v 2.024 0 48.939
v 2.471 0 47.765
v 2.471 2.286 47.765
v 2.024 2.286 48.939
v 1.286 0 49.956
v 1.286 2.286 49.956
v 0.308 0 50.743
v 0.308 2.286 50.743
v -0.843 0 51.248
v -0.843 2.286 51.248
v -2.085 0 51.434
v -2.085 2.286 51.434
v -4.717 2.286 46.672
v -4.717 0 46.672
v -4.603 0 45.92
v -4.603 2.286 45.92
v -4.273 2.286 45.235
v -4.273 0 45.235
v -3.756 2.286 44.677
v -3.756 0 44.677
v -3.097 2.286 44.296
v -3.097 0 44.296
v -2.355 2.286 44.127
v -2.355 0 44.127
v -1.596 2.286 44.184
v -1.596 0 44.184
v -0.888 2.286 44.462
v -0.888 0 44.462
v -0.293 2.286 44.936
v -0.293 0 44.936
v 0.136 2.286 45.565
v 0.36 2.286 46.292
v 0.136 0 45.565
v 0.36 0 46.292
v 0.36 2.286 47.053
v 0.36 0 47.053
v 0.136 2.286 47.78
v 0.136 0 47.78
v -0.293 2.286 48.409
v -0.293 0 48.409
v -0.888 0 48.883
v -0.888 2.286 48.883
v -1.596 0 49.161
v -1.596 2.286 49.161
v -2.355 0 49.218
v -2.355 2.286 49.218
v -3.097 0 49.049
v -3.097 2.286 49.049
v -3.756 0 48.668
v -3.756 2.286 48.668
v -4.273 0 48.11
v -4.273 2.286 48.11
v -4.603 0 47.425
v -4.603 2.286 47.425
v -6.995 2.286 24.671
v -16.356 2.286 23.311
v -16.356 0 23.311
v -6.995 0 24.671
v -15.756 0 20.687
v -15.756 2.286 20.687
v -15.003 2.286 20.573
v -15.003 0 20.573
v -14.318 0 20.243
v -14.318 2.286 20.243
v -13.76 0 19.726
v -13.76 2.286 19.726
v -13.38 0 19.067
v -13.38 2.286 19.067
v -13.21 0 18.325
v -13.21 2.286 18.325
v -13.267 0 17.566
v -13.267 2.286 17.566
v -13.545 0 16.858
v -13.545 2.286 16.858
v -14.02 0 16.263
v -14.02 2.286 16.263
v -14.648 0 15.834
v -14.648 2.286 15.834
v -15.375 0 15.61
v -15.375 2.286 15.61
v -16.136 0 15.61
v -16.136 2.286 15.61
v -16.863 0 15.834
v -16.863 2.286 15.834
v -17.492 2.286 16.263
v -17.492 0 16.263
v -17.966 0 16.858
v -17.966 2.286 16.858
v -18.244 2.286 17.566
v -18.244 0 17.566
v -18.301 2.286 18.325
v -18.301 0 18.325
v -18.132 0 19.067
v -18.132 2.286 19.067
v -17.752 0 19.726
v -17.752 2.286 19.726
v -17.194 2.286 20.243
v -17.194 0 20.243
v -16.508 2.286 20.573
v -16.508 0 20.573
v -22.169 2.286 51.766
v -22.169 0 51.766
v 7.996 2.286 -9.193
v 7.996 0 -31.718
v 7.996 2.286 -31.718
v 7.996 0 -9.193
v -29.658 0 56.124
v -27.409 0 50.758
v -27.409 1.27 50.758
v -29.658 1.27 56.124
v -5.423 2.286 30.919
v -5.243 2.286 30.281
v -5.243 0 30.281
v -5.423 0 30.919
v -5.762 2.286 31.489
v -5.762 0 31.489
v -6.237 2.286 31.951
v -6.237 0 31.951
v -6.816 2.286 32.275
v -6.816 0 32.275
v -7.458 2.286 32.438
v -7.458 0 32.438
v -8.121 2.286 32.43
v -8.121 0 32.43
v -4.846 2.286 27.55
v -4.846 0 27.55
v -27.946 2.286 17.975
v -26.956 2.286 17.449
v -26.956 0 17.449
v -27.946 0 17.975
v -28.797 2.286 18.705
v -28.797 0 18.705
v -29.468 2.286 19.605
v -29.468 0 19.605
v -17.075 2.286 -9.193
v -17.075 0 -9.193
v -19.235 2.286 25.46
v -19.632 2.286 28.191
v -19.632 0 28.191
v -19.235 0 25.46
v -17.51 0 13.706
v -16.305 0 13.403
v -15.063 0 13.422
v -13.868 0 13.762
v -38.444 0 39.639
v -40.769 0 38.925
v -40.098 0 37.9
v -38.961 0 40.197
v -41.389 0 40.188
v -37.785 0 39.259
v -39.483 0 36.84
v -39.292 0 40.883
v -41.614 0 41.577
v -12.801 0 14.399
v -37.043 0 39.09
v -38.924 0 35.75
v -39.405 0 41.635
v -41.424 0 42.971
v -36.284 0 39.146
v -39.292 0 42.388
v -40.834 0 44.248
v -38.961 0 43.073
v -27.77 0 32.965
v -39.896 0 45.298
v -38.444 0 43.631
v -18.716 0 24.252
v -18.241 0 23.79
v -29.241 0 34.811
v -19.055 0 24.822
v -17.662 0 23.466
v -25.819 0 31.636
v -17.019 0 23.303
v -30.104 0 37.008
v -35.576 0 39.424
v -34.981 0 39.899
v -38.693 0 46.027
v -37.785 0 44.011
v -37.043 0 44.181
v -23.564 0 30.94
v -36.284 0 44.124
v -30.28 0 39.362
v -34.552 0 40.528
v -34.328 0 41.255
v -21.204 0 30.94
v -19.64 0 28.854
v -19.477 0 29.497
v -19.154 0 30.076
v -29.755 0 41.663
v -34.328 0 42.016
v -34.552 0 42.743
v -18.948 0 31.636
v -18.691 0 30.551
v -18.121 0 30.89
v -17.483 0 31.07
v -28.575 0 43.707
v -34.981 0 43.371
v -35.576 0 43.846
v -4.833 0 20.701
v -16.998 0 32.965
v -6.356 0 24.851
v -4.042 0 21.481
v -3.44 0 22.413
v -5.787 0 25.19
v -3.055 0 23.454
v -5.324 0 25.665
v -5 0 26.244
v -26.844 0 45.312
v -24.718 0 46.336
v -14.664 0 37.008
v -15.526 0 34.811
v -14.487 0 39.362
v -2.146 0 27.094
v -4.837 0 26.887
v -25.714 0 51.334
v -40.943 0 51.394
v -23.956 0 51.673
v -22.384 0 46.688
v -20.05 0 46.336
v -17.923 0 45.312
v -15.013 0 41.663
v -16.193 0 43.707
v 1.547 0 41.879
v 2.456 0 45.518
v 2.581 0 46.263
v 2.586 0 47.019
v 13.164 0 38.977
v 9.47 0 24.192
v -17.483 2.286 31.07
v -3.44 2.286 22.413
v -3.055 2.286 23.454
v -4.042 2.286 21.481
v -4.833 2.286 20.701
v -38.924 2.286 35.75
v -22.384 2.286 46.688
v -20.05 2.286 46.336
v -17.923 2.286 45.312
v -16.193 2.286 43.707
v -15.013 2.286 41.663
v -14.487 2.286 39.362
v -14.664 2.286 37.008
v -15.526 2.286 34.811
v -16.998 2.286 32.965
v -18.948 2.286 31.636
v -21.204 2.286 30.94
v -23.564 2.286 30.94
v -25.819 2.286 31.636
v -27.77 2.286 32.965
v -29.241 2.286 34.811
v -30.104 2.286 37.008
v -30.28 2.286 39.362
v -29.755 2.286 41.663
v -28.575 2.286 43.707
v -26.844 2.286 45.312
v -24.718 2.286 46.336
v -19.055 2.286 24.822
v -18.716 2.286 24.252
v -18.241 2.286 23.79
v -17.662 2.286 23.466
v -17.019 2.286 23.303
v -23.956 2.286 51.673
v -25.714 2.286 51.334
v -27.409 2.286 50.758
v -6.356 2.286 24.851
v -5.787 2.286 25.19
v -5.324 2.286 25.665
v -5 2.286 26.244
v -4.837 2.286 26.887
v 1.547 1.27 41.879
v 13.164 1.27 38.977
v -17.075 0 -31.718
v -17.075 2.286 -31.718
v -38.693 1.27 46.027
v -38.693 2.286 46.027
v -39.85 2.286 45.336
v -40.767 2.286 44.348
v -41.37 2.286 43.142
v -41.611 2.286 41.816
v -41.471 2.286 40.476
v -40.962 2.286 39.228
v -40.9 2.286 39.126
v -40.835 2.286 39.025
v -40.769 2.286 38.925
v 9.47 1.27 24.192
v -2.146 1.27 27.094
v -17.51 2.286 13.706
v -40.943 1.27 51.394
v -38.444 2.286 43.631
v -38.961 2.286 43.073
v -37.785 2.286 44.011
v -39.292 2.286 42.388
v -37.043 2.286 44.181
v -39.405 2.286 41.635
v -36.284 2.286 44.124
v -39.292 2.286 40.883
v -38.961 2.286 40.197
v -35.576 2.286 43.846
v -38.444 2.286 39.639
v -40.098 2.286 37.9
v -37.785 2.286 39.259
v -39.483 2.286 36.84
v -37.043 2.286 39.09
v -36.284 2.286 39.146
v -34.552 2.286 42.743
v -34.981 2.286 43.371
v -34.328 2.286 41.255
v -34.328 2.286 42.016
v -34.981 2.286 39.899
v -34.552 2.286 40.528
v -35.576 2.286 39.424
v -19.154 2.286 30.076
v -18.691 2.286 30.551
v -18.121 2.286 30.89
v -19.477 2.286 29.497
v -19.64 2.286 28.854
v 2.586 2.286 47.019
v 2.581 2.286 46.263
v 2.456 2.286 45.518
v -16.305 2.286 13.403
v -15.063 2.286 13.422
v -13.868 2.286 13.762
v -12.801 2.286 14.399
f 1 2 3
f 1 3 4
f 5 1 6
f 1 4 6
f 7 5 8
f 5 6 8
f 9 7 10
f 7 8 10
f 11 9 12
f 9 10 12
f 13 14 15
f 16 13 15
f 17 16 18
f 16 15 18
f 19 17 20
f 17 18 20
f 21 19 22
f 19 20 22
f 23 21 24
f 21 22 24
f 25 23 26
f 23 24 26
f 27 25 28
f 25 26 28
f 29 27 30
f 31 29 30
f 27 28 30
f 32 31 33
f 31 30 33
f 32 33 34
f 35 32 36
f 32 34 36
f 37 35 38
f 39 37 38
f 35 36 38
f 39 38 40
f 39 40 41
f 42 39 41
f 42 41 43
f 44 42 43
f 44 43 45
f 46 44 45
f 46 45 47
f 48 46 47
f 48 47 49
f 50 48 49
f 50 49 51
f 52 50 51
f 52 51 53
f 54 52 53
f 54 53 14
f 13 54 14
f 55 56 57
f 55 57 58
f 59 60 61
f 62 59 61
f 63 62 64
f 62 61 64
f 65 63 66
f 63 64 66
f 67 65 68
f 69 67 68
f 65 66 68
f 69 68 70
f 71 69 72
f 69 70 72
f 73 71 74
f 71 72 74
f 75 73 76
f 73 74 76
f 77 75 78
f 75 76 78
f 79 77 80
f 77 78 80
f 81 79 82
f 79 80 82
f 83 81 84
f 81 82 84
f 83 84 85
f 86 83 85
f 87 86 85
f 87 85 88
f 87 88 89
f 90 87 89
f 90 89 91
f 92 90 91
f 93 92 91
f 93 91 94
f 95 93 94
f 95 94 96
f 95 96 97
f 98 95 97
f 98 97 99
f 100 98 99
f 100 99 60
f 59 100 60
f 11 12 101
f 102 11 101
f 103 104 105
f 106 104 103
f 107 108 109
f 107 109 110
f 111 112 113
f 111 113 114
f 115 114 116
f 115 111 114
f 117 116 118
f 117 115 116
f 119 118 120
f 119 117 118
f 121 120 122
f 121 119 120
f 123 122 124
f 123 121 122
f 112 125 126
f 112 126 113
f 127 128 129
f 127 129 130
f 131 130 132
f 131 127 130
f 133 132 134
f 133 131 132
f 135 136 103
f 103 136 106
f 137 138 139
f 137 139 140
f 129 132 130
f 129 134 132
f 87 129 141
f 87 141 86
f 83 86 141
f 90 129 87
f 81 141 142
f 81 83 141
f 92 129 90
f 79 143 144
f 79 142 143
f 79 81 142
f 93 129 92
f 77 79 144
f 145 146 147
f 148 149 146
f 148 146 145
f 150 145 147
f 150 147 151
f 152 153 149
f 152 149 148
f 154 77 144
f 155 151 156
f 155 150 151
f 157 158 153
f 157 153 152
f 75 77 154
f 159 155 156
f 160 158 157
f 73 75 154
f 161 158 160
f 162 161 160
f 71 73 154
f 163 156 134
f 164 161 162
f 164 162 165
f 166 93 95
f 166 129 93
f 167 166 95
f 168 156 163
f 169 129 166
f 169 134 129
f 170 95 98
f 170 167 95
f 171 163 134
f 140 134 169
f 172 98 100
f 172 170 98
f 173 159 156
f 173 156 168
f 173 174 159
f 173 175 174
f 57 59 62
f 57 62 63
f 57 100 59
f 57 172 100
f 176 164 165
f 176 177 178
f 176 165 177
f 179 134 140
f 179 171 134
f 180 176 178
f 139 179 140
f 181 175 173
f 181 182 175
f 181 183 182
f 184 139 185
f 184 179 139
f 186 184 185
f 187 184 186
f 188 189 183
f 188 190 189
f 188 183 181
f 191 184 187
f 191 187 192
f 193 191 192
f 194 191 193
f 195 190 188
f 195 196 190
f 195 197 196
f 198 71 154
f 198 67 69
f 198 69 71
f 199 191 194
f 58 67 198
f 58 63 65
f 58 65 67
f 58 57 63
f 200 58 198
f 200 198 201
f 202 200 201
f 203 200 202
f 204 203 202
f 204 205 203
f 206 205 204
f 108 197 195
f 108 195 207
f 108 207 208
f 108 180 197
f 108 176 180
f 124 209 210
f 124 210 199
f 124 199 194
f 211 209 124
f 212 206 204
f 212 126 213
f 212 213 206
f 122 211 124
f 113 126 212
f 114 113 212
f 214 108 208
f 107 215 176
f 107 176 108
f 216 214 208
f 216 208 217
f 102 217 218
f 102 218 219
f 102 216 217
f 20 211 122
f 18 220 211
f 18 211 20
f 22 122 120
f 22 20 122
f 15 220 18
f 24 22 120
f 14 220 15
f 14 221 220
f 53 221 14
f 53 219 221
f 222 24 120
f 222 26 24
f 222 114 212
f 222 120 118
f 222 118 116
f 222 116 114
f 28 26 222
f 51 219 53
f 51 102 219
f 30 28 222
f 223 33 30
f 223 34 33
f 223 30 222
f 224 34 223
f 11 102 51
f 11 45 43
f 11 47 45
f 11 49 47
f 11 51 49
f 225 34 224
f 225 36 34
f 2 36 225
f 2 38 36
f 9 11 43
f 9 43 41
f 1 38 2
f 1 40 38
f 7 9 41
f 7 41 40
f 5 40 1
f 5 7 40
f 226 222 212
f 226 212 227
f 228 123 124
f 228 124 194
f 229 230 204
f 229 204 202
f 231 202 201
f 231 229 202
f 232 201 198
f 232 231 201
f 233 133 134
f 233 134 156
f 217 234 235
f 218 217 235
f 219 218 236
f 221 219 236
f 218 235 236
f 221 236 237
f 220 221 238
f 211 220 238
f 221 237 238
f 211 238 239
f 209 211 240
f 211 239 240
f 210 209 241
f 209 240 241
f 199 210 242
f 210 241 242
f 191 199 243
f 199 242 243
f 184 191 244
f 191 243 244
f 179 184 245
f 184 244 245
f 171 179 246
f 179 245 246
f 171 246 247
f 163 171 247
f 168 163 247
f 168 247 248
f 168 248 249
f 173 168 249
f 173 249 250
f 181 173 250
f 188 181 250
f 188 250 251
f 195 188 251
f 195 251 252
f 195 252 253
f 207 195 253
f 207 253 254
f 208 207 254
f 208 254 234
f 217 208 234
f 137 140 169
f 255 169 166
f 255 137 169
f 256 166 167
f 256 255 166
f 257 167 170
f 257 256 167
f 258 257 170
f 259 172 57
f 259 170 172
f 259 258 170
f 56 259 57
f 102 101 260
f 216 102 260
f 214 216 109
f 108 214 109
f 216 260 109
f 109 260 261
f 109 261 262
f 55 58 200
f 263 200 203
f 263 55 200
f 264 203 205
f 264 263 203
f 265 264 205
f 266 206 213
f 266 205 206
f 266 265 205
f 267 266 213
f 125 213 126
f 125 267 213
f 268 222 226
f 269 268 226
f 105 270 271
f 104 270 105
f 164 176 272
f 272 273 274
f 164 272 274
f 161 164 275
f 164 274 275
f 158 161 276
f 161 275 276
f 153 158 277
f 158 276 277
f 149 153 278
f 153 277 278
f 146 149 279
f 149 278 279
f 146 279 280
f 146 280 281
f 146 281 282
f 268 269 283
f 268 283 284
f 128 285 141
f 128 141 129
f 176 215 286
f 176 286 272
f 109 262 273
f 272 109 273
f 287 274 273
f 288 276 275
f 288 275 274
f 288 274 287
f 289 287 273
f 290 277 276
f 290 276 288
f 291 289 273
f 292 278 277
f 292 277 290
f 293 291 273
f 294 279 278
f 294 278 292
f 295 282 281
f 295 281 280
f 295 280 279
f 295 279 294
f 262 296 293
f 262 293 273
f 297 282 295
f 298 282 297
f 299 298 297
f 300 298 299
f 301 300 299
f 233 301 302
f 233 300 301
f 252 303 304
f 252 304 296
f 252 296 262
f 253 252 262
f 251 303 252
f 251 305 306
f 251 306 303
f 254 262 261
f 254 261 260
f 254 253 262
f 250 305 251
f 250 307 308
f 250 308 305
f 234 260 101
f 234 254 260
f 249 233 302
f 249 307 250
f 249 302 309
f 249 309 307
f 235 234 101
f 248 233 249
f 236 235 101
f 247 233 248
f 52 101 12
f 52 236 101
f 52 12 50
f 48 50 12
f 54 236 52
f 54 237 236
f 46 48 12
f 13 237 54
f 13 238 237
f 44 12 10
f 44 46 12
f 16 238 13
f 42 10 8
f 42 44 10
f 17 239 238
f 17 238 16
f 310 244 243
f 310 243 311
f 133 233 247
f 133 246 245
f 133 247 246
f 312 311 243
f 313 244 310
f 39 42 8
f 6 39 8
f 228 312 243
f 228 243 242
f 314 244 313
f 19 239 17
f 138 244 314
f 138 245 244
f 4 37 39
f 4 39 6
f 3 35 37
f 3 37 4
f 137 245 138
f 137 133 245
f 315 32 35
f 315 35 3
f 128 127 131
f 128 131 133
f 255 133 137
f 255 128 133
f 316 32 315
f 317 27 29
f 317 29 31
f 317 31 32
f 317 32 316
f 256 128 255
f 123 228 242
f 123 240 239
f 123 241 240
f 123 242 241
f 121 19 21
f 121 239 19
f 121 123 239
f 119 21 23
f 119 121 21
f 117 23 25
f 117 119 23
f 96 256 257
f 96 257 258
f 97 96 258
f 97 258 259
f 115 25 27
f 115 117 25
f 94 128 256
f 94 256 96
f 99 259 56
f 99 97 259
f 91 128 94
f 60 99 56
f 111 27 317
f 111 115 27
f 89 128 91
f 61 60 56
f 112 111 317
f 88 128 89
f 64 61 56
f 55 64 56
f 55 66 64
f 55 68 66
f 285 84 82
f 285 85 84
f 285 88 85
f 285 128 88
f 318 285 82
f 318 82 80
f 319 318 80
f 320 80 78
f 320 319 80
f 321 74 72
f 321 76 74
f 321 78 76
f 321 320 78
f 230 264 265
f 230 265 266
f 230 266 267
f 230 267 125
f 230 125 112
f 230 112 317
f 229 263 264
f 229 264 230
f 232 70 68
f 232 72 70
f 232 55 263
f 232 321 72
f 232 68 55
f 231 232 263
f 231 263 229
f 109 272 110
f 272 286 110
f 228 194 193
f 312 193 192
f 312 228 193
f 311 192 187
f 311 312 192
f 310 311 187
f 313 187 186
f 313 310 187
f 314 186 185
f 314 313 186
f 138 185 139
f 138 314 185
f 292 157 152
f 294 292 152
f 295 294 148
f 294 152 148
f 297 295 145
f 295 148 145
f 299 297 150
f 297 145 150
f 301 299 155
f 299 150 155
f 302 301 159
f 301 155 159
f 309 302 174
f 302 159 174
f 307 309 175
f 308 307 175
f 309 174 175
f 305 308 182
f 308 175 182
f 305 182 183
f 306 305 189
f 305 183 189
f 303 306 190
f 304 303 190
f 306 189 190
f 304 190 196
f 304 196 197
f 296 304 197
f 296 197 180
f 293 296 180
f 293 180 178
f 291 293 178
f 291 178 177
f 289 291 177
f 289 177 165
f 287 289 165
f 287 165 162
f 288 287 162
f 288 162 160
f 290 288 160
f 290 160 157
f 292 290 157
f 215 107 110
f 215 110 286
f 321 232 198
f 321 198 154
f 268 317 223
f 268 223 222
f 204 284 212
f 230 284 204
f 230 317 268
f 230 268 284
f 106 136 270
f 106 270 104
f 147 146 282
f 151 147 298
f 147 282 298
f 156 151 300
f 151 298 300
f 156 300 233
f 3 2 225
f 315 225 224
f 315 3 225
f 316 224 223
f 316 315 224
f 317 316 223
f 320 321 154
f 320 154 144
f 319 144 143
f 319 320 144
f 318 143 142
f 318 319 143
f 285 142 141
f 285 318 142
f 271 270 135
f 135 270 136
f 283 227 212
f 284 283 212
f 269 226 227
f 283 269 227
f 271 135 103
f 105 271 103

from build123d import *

# Parameters (mm, degrees)
BOSS_EXTRUDE4_DEPTH              = 4.7625
CUT_EXTRUDE1_REACH               = 271.353
SKETCH6_R                        = 14.26845
SKETCH6_R_2                      = 22.86
CUT_EXTRUDE2_REACH               = 271.353
SKETCH7_R                        = 18.48095
CUT_EXTRUDE4_DEPTH               = 270.352829076
BOSS_EXTRUDE9_START              = -4.7625
BOSS_EXTRUDE9_DEPTH              = 4.7625
FILLET1_R                        = 7.62
F_10_CLEARANCE_HOLE1_D           = 4.9784
FILLET4_R                        = 50.8
F_8_32_TAPPED_HOLE1_D            = 3.4544
PIVOTING_BEAM_SENSOR_MOUNT_REACH = 271.268
SKETCH37_R                       = 1.5
SKETCH38_R                       = 7.91845
ENCODER_BOARD_ADDON_DEPTH        = 4.7625
F_10_32_TAPPED_HOLE1_D           = 4.0386
F_10_CLEARANCE_HOLE3_D           = 5.1054
SKETCH47_OUTSIDE_W               = 192.439
SKETCH47_OUTSIDE_H               = 382.734
SKETCH47_OUTSIDE_R               = 2.5527
CUT_EXTRUDE8_DEPTH               = 270.267923318
SKETCH47_2_R                     = 2.5527
CUT_EXTRUDE9_DEPTH               = 2.4765
BOSS_EXTRUDE17_DEPTH             = 1.27
SKETCH59_W                       = 25.070606449
SKETCH59_H                       = 22.525049467
BOSS_EXTRUDE18_DEPTH             = 2.286


with BuildPart() as part:
    # Sketch1 → Boss-Extrude4 (new body)
    with BuildSketch(Plane(origin=(0, 0, 0), x_dir=(1, 0, 0), z_dir=(0, 1, 0))):
        with BuildLine():
            Line((-48.759061319, 205.201963751), (-63.900240413, 124.413609674))
            Line((-63.900240413, 124.413609674), (-26.343120253, -7.50014102))
            ThreePointArc((-26.343120253, -7.50014102), (3.91326684, -27.109010359), (27.388801541, 0.256222825))
            ThreePointArc((27.388801541, 0.256222825), (34.508498918, 53.661639681), (56.295976161, 102.93774419))
            ThreePointArc((56.295976161, 102.93774419), (56.986751486, 124.47275891), (38.624985881, 135.745717413))
            ThreePointArc((38.624985881, 135.745717413), (4.94281576, 154.646064466), (1.637545013, 193.127058321))
            Line((1.637545013, 193.127058321), (18.706481277, 233.364638746))
            ThreePointArc((18.706481277, 233.364638746), (10.708035835, 258.569637187), (-15.424905572, 254.527799821))
            Line((-15.424905572, 254.527799821), (-37.390675283, 228.913568565))
            ThreePointArc((-37.390675283, 228.913568565), (-44.635714299, 217.806104366), (-48.759061319, 205.201963751))
        make_face()
    extrude(amount=BOSS_EXTRUDE4_DEPTH)

    # Sketch6 → Cut-Extrude1 (cut, up to next)
    with BuildSketch(Plane(origin=(0, 4.7625, 0), x_dir=(1, 0, 0), z_dir=(0, 1, 0)), mode=Mode.PRIVATE) as cut_extrude1_sk1:
        with Locations(Location((38.1, 114.3, 0), (0, 0, 270))):
            Circle(SKETCH6_R)
    cut_extrude1_tool1 = extrude(cut_extrude1_sk1.sketch, amount=-CUT_EXTRUDE1_REACH, mode=Mode.PRIVATE) & part.part
    # Sketch6 → Cut-Extrude1 (cut, up to next)
    with BuildSketch(Plane(origin=(0, 4.7625, 0), x_dir=(1, 0, 0), z_dir=(0, 1, 0)), mode=Mode.PRIVATE) as cut_extrude1_sk2:
        with Locations(Location((-4.294087555, 47.653799352, 0), (0, 0, 270))):
            Circle(SKETCH6_R_2)
    cut_extrude1_tool2 = extrude(cut_extrude1_sk2.sketch, amount=-CUT_EXTRUDE1_REACH, mode=Mode.PRIVATE) & part.part
    # Sketch6 → Cut-Extrude1 (cut, up to next)
    with BuildSketch(Plane(origin=(0, 4.7625, 0), x_dir=(1, 0, 0), z_dir=(0, 1, 0)), mode=Mode.PRIVATE) as cut_extrude1_sk3:
        with Locations(Location((-25.238541156, 93.240320194, 0), (0, 0, 270))):
            Circle(SKETCH6_R)
    cut_extrude1_tool3 = extrude(cut_extrude1_sk3.sketch, amount=-CUT_EXTRUDE1_REACH, mode=Mode.PRIVATE) & part.part
    # Sketch6 → Cut-Extrude1 (cut, up to next)
    with BuildSketch(Plane(origin=(0, 4.7625, 0), x_dir=(1, 0, 0), z_dir=(0, 1, 0)), mode=Mode.PRIVATE) as cut_extrude1_sk4:
        with Locations(Location((-31.378993813, 133.413749735, 0), (0, 0, 270))):
            Circle(SKETCH6_R)
    cut_extrude1_tool4 = extrude(cut_extrude1_sk4.sketch, amount=-CUT_EXTRUDE1_REACH, mode=Mode.PRIVATE) & part.part
    # Sketch6 → Cut-Extrude1 (cut, up to next)
    with BuildSketch(Plane(origin=(0, 4.7625, 0), x_dir=(1, 0, 0), z_dir=(0, 1, 0)), mode=Mode.PRIVATE) as cut_extrude1_sk5:
        with Locations(Location((0, 241.3, 0), (0, 0, 270))):
            Circle(SKETCH6_R)
    cut_extrude1_tool5 = extrude(cut_extrude1_sk5.sketch, amount=-CUT_EXTRUDE1_REACH, mode=Mode.PRIVATE) & part.part
    add(cut_extrude1_tool1.solids().sort_by_distance((38.1, 4.7625, -114.3))[0], mode=Mode.SUBTRACT)
    add(cut_extrude1_tool2.solids().sort_by_distance((-4.294088, 4.7625, -47.653799))[0], mode=Mode.SUBTRACT)
    add(cut_extrude1_tool3.solids().sort_by_distance((-25.238541, 4.7625, -93.24032))[0], mode=Mode.SUBTRACT)
    add(cut_extrude1_tool4.solids().sort_by_distance((-31.378994, 4.7625, -133.41375))[0], mode=Mode.SUBTRACT)
    add(cut_extrude1_tool5.solids().sort_by_distance((0, 4.7625, -241.3))[0], mode=Mode.SUBTRACT)

    # Sketch7 → Cut-Extrude2 (cut, up to next)
    with BuildSketch(Plane(origin=(0, 4.7625, 0), x_dir=(1, 0, 0), z_dir=(0, 1, 0)), mode=Mode.PRIVATE) as cut_extrude2_sk1:
        with Locations(Location((0, 0, 0), (0, 0, 270))):
            Circle(SKETCH7_R)
    cut_extrude2_tool1 = extrude(cut_extrude2_sk1.sketch, amount=-CUT_EXTRUDE2_REACH, mode=Mode.PRIVATE) & part.part
    add(cut_extrude2_tool1.solids().sort_by_distance((0, 4.7625, 0))[0], mode=Mode.SUBTRACT)

    # Sketch11 → Cut-Extrude4 (cut, through all)
    with BuildSketch(Plane(origin=(0, 4.7625, 0), x_dir=(1, 0, 0), z_dir=(0, 1, 0))):
        with BuildLine():
            Line((-14.24681913, 167.157327815), (-22.781165939, 169.646710179))
            ThreePointArc((-22.781165939, 169.646710179), (-24.940081812, 173.583756312), (-21.003035679, 175.742672185))
            Line((-21.003035679, 175.742672185), (-12.46868887, 173.253289821))
            ThreePointArc((-12.46868887, 173.253289821), (-10.309772997, 169.316243688), (-14.24681913, 167.157327815))
        make_face()
    extrude(amount=-CUT_EXTRUDE4_DEPTH, mode=Mode.SUBTRACT)

    # Sketch22 → Boss-Extrude9 (add)
    with BuildSketch(Plane(origin=(0, 4.7625, 0), x_dir=(1, 0, 0), z_dir=(0, 1, 0)).offset(BOSS_EXTRUDE9_START)):
        with BuildLine():
            Line((44.13587102, -0.238974107), (45.721176973, 83.59457079))
            ThreePointArc((45.721176973, 83.59457079), (31.828729714, 42.965057017), (27.388801541, 0.256222825))
            ThreePointArc((27.388801541, 0.256222825), (27.389946843, 0.053962259), (27.389598514, -0.14830125))
            Line((27.389598514, -0.14830125), (44.13587102, -0.238974107))
        make_face()
        with BuildLine():
            Line((-26.343120253, -7.50014102), (-63.900240413, 124.413609674))
            Line((-63.900240413, 124.413609674), (-58.659130106, 55.341604227))
            ThreePointArc((-58.659130106, 55.341604227), (-58.57862185, 54.70676299), (-58.434627096, 54.083248366))
            Line((-58.434627096, 54.083248366), (-39.267840062, -13.237215919))
            Line((-39.267840062, -13.237215919), (-25.732483938, -9.383569172))
            ThreePointArc((-25.732483938, -9.383569172), (-26.054826105, -8.447374541), (-26.343120253, -7.50014102))
        make_face()
    extrude(amount=BOSS_EXTRUDE9_DEPTH)

    # Fillet1
    fillet1_edges = [part.edges().sort_by_distance(p)[0] for p in [
        (44.13587102, 2.38125, 0.238974107),
        (27.389598514, 2.38125, 0.14830125),
        (45.721176973, 2.38125, -83.59457079),
        (-25.732483938, 2.38125, 9.383569172),
    ]]
    fillet(fillet1_edges, radius=FILLET1_R)

    # #10 Clearance Hole1 (through all)
    with Locations(Plane(origin=(0, 4.7625, 0), x_dir=(1, 0, 0), z_dir=(0, 1, 0))):
        with Locations((-20.169087555, 23.894274946), (-52.327331966, 55.822054335), (31.486575952, 69.734116153), (0.686224782, 152.463749735), (-32.612193782, 193.553892754), (-52.098807962, 161.528602156)):
            Hole(F_10_CLEARANCE_HOLE1_D / 2)

    # Fillet4
    fillet4_edges = [part.edges().sort_by_distance(p)[0] for p in [
        (-63.900240413, 2.38125, -124.413609674),
    ]]
    fillet(fillet4_edges, radius=FILLET4_R)

    # #8-32 Tapped Hole1 (through all)
    with Locations(Plane(origin=(0, 4.7625, 0), x_dir=(1, 0, 0), z_dir=(0, 1, 0))):
        with Locations((1.914830287, -21.24990167), (13.247190201, 16.725335505), (-17.940310329, 11.548599972)):
            Hole(F_8_32_TAPPED_HOLE1_D / 2)

    # Sketch37 → Pivoting Beam Sensor Mount (cut, up to next)
    with BuildSketch(Plane.XZ, mode=Mode.PRIVATE) as pivoting_beam_sensor_mount_sk1:
        with Locations(Location((23.083384984, -92.174973762, 0), (0, 0, 270))):
            Circle(SKETCH37_R)
    pivoting_beam_sensor_mount_tool1 = extrude(pivoting_beam_sensor_mount_sk1.sketch, amount=-PIVOTING_BEAM_SENSOR_MOUNT_REACH, mode=Mode.PRIVATE) & part.part
    # Sketch37 → Pivoting Beam Sensor Mount (cut, up to next)
    with BuildSketch(Plane.XZ, mode=Mode.PRIVATE) as pivoting_beam_sensor_mount_sk2:
        with BuildLine():
            ThreePointArc((-3.647543534, -89.163751321), (-3.541377345, -96.013206549), (-1.708587973, -102.613751321))
            ThreePointArc((-1.708587973, -102.613751321), (0.255952019, -103.414115377), (1.056316075, -101.449575385))
            ThreePointArc((1.056316075, -101.449575385), (-0.572072996, -95.585150848), (-0.666399089, -89.499575385))
            ThreePointArc((-0.666399089, -89.499575385), (-1.989059279, -87.841091131), (-3.647543534, -89.163751321))
        make_face()
    pivoting_beam_sensor_mount_tool2 = extrude(pivoting_beam_sensor_mount_sk2.sketch, amount=-PIVOTING_BEAM_SENSOR_MOUNT_REACH, mode=Mode.PRIVATE) & part.part
    add(pivoting_beam_sensor_mount_tool1.solids().sort_by_distance((23.083385, 0, -92.174974))[0], mode=Mode.SUBTRACT)
    add(pivoting_beam_sensor_mount_tool2.solids().sort_by_distance((-1.700962, 0, -95.747892))[0], mode=Mode.SUBTRACT)

    # Sketch38 → Encoder Board Addon (add)
    with BuildSketch(Plane(origin=(0, 4.7625, 0), x_dir=(1, 0, 0), z_dir=(0, 1, 0))):
        with BuildLine():
            Line((-37.529034093, -19.344511049), (-39.267840062, -13.237215919))
            Line((-39.267840062, -13.237215919), (-31.839812047, -11.12238453))
            ThreePointArc((-31.839812047, -11.12238453), (-27.003669081, -11.344505665), (-23.277388672, -14.435209614))
            ThreePointArc((-23.277388672, -14.435209614), (-5.966086008, -26.732338427), (14.931018089, -22.962508548))
            ThreePointArc((14.931018089, -22.962508548), (8.591508195, -29.075813245), (4.9829433, -37.109501029))
            Line((4.9829433, -37.109501029), (2.47141259, -47.765086321))
            ThreePointArc((2.47141259, -47.765086321), (0.822880543, -50.381887664), (-2.085320348, -51.434348945))
            Line((-2.085320348, -51.434348945), (-22.168826979, -51.766465319))
            ThreePointArc((-22.168826979, -51.766465319), (-24.841143263, -51.533840241), (-27.408807967, -50.757640062))
            Line((-27.408807967, -50.757640062), (-38.693349579, -46.027393508))
            ThreePointArc((-38.693349579, -46.027393508), (-41.42356145, -42.97092165), (-40.768594617, -38.925294934))
            ThreePointArc((-40.768594617, -38.925294934), (-36.952648742, -29.498249601), (-37.529034093, -19.344511049))
        make_face()
        with Locations(Location((-22.38375, -38.769792264, 0), (0, 0, 270))):
            Circle(SKETCH38_R, mode=Mode.SUBTRACT)
    extrude(amount=-ENCODER_BOARD_ADDON_DEPTH)

    # #10-32 Tapped Hole1 (through all)
    with Locations(Plane(origin=(0, 4.7625, 0), x_dir=(1, 0, 0), z_dir=(0, 1, 0))):
        with Locations((-2.164065959, -46.6725), (-36.852219401, -41.635167886), (-15.755793253, -18.133994079)):
            Hole(F_10_32_TAPPED_HOLE1_D / 2)

    # #10 Clearance Hole3 (through all)
    with Locations(Plane(origin=(0, 4.7625, 0), x_dir=(1, 0, 0), z_dir=(0, 1, 0))):
        with Locations((-36.852219401, -41.635167886), (-2.164065959, -46.6725)):
            Hole(F_10_CLEARANCE_HOLE3_D / 2)

    # Sketch47 outside → Cut-Extrude8 (cut, through all)
    # profile 1 of 3: a face of its own
    with BuildSketch(Plane(origin=(0, 4.7625, 0), x_dir=(1, 0, 0), z_dir=(0, 1, 0))):
        with Locations((-1.9945, 104.926)):
            Rectangle(SKETCH47_OUTSIDE_W, SKETCH47_OUTSIDE_H)
        with BuildLine():
            Line((-38.693349579, -46.027393508), (-27.408807967, -50.757640062))
            ThreePointArc((-27.408807967, -50.757640062), (-24.841143263, -51.533840241), (-22.168826979, -51.766465319))
            Line((-22.168826979, -51.766465319), (-2.085320348, -51.434348945))
            ThreePointArc((-2.085320348, -51.434348945), (1.613604275, -49.572605834), (2.456445703, -45.518256427))
            Line((2.456445703, -45.518256427), (-3.055299638, -23.454383414))
            ThreePointArc((-3.055299638, -23.454383414), (-3.715825704, -21.93050709), (-4.832568275, -20.701125227))
            Line((-4.832568275, -20.701125227), (-12.801470938, -14.398570955))
            ThreePointArc((-12.801470938, -14.398570955), (-15.063238725, -13.422118181), (-17.510319119, -13.706461444))
            Line((-17.510319119, -13.706461444), (-26.955722074, -17.449449957))
            ThreePointArc((-26.955722074, -17.449449957), (-28.392130747, -18.316742481), (-29.467648755, -19.604658322))
            Line((-29.467648755, -19.604658322), (-40.96167653, -39.228143092))
            ThreePointArc((-40.96167653, -39.228143092), (-41.369942708, -43.14234484), (-38.693349579, -46.027393508))
        make_face(mode=Mode.SUBTRACT)
    # profile 2 of 3: a face of its own
    with BuildSketch(Plane(origin=(0, 4.7625, 0), x_dir=(1, 0, 0), z_dir=(0, 1, 0))):
        with Locations(Location((-15.755793253, -18.133994079, 0), (0, 0, 270))):
            Circle(SKETCH47_OUTSIDE_R)
    # profile 3 of 3: a face of its own
    with BuildSketch(Plane(origin=(0, 4.7625, 0), x_dir=(1, 0, 0), z_dir=(0, 1, 0))):
        with BuildLine():
            Line((-4.84593204, -27.549630083), (-5.242572374, -30.280980815))
            ThreePointArc((-5.242572374, -30.280980815), (-6.23690981, -31.951475606), (-8.121230748, -32.429591056))
            Line((-8.121230748, -32.429591056), (-17.48303399, -31.070091993))
            ThreePointArc((-17.48303399, -31.070091993), (-19.153528781, -30.075754557), (-19.631644231, -28.191433619))
            Line((-19.631644231, -28.191433619), (-19.235003898, -25.460082887))
            ThreePointArc((-19.235003898, -25.460082887), (-18.240666462, -23.789588097), (-16.356345524, -23.311472646))
            Line((-16.356345524, -23.311472646), (-6.994542282, -24.67097171))
            ThreePointArc((-6.994542282, -24.67097171), (-5.324047491, -25.665309145), (-4.84593204, -27.549630083))
        make_face()
    extrude(amount=-CUT_EXTRUDE8_DEPTH, mode=Mode.SUBTRACT)

    # Sketch47<2> → Cut-Extrude9 (cut)
    with BuildSketch(Plane(origin=(0, 4.7625, 0), x_dir=(1, 0, 0), z_dir=(0, 1, 0))):
        with BuildLine():
            Line((-38.693349579, -46.027393508), (-27.408807967, -50.757640062))
            ThreePointArc((-27.408807967, -50.757640062), (-24.841143263, -51.533840241), (-22.168826979, -51.766465319))
            Line((-22.168826979, -51.766465319), (-2.085320348, -51.434348945))
            ThreePointArc((-2.085320348, -51.434348945), (1.613604275, -49.572605834), (2.456445703, -45.518256427))
            Line((2.456445703, -45.518256427), (-3.055299638, -23.454383414))
            ThreePointArc((-3.055299638, -23.454383414), (-3.715825704, -21.93050709), (-4.832568275, -20.701125227))
            Line((-4.832568275, -20.701125227), (-12.801470938, -14.398570955))
            ThreePointArc((-12.801470938, -14.398570955), (-15.063238725, -13.422118181), (-17.510319119, -13.706461444))
            Line((-17.510319119, -13.706461444), (-26.955722074, -17.449449957))
            ThreePointArc((-26.955722074, -17.449449957), (-28.392130747, -18.316742481), (-29.467648755, -19.604658322))
            Line((-29.467648755, -19.604658322), (-40.96167653, -39.228143092))
            ThreePointArc((-40.96167653, -39.228143092), (-41.369942708, -43.14234484), (-38.693349579, -46.027393508))
        make_face()
        with Locations(Location((-15.755793253, -18.133994079, 0), (0, 0, 270))):
            Circle(SKETCH47_2_R, mode=Mode.SUBTRACT)
        with BuildLine():
            Line((-4.84593204, -27.549630083), (-5.242572374, -30.280980815))
            ThreePointArc((-5.242572374, -30.280980815), (-6.23690981, -31.951475606), (-8.121230748, -32.429591056))
            Line((-8.121230748, -32.429591056), (-17.48303399, -31.070091993))
            ThreePointArc((-17.48303399, -31.070091993), (-19.153528781, -30.075754557), (-19.631644231, -28.191433619))
            Line((-19.631644231, -28.191433619), (-19.235003898, -25.460082887))
            ThreePointArc((-19.235003898, -25.460082887), (-18.240666462, -23.789588097), (-16.356345524, -23.311472646))
            Line((-16.356345524, -23.311472646), (-6.994542282, -24.67097171))
            ThreePointArc((-6.994542282, -24.67097171), (-5.324047491, -25.665309145), (-4.84593204, -27.549630083))
        make_face(mode=Mode.SUBTRACT)
    extrude(amount=-CUT_EXTRUDE9_DEPTH, mode=Mode.SUBTRACT)

    # Sketch57 → Boss-Extrude17 (add)
    with BuildSketch(Plane.XZ):
        Polygon((-2.146216684, 27.09350126), (1.54736275, 41.87913858), (13.16374728, 38.977265765), (9.470167845, 24.191628444), align=None)
        Polygon((-38.693349579, 46.027393508), (-27.408807967, 50.757640062), (-29.658175238, 56.12376174), (-40.942716851, 51.393515186), align=None)
    extrude(amount=-BOSS_EXTRUDE17_DEPTH)


with BuildPart() as body_2:
    # Sketch59 → Boss-Extrude18 (new body)
    with BuildSketch(Plane.XZ):
        with Locations((-4.539267441, -20.455372988)):
            Rectangle(SKETCH59_W, SKETCH59_H)
    extrude(amount=-BOSS_EXTRUDE18_DEPTH)


solid = Compound([part.part, body_2.part])
